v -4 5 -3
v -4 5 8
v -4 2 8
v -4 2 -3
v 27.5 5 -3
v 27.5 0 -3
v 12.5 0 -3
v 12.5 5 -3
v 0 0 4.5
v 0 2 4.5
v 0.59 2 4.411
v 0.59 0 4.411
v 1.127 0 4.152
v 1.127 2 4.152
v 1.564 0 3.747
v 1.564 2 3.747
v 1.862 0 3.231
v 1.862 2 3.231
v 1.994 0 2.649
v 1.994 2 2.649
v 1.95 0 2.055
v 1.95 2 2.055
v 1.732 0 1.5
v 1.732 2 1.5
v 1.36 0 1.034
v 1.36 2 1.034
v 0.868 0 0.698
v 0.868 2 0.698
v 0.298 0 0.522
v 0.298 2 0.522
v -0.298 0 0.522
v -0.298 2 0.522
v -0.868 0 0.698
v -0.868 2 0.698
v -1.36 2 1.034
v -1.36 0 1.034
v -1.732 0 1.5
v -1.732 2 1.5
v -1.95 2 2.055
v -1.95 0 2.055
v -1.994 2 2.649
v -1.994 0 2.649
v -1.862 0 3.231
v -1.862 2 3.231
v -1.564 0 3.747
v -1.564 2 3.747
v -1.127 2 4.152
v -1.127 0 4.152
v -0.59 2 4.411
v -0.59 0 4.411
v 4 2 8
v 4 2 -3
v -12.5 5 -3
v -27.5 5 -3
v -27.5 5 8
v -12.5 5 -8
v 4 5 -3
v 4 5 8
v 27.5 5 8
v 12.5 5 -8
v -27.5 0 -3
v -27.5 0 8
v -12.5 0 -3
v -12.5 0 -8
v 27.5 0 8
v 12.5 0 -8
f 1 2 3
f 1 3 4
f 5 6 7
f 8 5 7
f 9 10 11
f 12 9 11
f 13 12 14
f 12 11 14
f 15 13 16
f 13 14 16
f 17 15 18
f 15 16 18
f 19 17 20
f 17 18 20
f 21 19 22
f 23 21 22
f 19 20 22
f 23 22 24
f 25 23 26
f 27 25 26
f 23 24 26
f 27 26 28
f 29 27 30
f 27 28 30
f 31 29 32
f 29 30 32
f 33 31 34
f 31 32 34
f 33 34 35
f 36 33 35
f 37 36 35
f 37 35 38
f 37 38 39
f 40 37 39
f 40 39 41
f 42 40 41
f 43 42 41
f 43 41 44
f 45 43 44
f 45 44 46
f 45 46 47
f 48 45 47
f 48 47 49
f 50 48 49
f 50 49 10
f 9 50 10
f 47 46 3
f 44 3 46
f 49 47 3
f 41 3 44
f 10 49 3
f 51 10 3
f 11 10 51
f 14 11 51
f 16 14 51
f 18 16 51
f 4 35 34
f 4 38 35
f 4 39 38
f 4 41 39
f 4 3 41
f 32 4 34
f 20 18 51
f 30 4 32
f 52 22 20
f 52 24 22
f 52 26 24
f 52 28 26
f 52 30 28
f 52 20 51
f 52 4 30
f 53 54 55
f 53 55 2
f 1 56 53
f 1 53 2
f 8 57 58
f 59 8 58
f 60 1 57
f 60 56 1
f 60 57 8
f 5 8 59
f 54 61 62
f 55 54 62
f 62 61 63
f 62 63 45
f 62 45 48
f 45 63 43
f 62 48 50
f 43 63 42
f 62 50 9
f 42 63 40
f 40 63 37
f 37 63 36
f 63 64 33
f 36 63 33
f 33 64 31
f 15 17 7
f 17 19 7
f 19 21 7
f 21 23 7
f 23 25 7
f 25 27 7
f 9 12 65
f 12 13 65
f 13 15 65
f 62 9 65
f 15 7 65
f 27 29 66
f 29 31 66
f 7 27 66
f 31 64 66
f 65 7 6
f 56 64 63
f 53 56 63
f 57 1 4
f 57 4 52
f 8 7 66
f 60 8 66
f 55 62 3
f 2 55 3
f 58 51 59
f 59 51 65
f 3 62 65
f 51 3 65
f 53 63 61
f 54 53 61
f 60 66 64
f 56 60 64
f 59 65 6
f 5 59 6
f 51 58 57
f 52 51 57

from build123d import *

# Parameters (mm, degrees)
BOSS_EXTRU_1_DEPTH      = 5
ESQUISSE2_W             = 8
ESQUISSE2_H             = 11
ENL_V_MAT_EXTRU_5_DEPTH = 3
ESQUISSE3_R             = 2
ENL_V_MAT_EXTRU_6_DEPTH = 29.7967012


with BuildPart() as part:
    # Esquisse1 → Boss.-Extru.1 (new body)
    with BuildSketch(Plane(origin=(0, 0, 0), x_dir=(1, 0, 0), z_dir=(0, 1, 0))):
        Polygon((-12.5, 8), (-12.5, 3), (-27.5, 3), (-27.5, -8), (27.5, -8), (27.5, 3), (12.5, 3), (12.5, 8), align=None)
    extrude(amount=BOSS_EXTRU_1_DEPTH)

    # Esquisse2 → Enlèv. mat.-Extru.5 (cut)
    with BuildSketch(Plane(origin=(0, 5, 0), x_dir=(1, 0, 0), z_dir=(0, 1, 0))):
        with Locations((0, -2.5)):
            Rectangle(ESQUISSE2_W, ESQUISSE2_H)
    extrude(amount=-ENL_V_MAT_EXTRU_5_DEPTH, mode=Mode.SUBTRACT)

    # Esquisse3 → Enlèv. mat.-Extru.6 (cut, through all)
    with BuildSketch(Plane(origin=(0, 2, 0), x_dir=(1, 0, 0), z_dir=(0, 1, 0))):
        with Locations(Location((0, -2.5, 0), (0, 0, 270))):
            Circle(ESQUISSE3_R)
    extrude(amount=-ENL_V_MAT_EXTRU_6_DEPTH, mode=Mode.SUBTRACT)


solid = part.part
